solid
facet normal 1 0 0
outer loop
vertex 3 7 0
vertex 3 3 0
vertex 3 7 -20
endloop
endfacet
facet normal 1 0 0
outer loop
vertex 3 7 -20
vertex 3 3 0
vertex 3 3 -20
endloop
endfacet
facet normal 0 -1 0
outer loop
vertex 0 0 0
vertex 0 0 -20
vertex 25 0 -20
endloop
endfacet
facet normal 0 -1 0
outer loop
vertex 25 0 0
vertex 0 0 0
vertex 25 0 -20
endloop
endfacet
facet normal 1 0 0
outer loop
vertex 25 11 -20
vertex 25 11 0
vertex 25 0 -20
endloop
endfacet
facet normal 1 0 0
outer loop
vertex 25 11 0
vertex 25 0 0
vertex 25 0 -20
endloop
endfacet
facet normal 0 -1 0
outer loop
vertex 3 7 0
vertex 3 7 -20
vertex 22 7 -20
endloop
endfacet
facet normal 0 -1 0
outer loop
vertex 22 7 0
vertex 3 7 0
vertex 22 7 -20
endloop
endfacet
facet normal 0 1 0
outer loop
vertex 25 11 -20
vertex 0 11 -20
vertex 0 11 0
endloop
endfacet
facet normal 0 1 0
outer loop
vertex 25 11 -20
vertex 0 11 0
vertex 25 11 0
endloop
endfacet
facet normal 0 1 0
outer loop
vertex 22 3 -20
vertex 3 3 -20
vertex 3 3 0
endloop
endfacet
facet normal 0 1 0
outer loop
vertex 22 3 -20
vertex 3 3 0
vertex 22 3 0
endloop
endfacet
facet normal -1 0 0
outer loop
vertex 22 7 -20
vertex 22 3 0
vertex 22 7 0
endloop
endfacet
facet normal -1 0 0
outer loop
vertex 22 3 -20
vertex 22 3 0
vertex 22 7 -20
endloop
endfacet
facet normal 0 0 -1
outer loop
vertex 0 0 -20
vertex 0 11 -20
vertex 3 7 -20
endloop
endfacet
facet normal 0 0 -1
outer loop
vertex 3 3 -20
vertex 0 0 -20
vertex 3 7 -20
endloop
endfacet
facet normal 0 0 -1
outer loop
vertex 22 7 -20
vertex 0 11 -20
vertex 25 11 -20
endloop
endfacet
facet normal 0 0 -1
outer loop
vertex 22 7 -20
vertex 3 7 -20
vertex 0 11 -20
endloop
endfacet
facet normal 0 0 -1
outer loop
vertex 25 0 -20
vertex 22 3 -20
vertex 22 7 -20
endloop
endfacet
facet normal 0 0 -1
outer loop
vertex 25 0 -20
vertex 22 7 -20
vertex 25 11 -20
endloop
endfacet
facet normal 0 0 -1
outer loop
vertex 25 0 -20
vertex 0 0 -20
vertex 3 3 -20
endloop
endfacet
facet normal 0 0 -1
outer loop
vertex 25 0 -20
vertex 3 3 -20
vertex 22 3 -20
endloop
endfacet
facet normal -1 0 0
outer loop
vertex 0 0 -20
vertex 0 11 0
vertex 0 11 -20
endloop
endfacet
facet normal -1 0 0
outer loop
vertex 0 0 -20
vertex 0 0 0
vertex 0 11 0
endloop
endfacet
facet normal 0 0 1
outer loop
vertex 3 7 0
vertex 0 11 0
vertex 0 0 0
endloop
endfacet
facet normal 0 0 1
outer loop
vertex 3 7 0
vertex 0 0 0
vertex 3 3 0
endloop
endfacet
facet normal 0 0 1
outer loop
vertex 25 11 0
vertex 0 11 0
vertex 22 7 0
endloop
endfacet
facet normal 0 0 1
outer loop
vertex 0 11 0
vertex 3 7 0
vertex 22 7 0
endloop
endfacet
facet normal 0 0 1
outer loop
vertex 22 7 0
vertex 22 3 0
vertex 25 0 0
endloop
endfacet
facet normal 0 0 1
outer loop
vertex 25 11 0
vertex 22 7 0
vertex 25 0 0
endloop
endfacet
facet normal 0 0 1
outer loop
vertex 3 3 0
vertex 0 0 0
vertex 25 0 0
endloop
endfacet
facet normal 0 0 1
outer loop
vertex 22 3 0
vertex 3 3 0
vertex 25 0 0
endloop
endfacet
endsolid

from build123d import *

# Parameters (mm, degrees)
SKETCH1_W           = 25
SKETCH1_H           = 20
BOSS_EXTRUDE1_DEPTH = 3
SKETCH2_W           = 3
SKETCH2_H           = 20
BOSS_EXTRUDE2_DEPTH = 4
SKETCH3_W           = 25
SKETCH3_H           = 20
BOSS_EXTRUDE3_DEPTH = 4


with BuildPart() as part:
    # Sketch1 → Boss-Extrude1 (new body)
    with BuildSketch(Plane(origin=(0, 0, 0), x_dir=(1, 0, 0), z_dir=(0, 1, 0))):
        with Locations((12.5, 10)):
            Rectangle(SKETCH1_W, SKETCH1_H)
    extrude(amount=BOSS_EXTRUDE1_DEPTH)

    # Sketch2 → Boss-Extrude2 (add)
    with BuildSketch(Plane(origin=(0, 3, 0), x_dir=(1, 0, 0), z_dir=(0, 1, 0))):
        with Locations((1.5, 10)):
            Rectangle(SKETCH2_W, SKETCH2_H)
        with Locations((23.5, 10)):
            Rectangle(SKETCH2_W, SKETCH2_H)
    extrude(amount=BOSS_EXTRUDE2_DEPTH)

    # Sketch3 → Boss-Extrude3 (add)
    with BuildSketch(Plane(origin=(0, 7, 0), x_dir=(1, 0, 0), z_dir=(0, 1, 0))):
        with Locations((12.5, 10)):
            Rectangle(SKETCH3_W, SKETCH3_H)
    extrude(amount=BOSS_EXTRUDE3_DEPTH)


solid = part.part
